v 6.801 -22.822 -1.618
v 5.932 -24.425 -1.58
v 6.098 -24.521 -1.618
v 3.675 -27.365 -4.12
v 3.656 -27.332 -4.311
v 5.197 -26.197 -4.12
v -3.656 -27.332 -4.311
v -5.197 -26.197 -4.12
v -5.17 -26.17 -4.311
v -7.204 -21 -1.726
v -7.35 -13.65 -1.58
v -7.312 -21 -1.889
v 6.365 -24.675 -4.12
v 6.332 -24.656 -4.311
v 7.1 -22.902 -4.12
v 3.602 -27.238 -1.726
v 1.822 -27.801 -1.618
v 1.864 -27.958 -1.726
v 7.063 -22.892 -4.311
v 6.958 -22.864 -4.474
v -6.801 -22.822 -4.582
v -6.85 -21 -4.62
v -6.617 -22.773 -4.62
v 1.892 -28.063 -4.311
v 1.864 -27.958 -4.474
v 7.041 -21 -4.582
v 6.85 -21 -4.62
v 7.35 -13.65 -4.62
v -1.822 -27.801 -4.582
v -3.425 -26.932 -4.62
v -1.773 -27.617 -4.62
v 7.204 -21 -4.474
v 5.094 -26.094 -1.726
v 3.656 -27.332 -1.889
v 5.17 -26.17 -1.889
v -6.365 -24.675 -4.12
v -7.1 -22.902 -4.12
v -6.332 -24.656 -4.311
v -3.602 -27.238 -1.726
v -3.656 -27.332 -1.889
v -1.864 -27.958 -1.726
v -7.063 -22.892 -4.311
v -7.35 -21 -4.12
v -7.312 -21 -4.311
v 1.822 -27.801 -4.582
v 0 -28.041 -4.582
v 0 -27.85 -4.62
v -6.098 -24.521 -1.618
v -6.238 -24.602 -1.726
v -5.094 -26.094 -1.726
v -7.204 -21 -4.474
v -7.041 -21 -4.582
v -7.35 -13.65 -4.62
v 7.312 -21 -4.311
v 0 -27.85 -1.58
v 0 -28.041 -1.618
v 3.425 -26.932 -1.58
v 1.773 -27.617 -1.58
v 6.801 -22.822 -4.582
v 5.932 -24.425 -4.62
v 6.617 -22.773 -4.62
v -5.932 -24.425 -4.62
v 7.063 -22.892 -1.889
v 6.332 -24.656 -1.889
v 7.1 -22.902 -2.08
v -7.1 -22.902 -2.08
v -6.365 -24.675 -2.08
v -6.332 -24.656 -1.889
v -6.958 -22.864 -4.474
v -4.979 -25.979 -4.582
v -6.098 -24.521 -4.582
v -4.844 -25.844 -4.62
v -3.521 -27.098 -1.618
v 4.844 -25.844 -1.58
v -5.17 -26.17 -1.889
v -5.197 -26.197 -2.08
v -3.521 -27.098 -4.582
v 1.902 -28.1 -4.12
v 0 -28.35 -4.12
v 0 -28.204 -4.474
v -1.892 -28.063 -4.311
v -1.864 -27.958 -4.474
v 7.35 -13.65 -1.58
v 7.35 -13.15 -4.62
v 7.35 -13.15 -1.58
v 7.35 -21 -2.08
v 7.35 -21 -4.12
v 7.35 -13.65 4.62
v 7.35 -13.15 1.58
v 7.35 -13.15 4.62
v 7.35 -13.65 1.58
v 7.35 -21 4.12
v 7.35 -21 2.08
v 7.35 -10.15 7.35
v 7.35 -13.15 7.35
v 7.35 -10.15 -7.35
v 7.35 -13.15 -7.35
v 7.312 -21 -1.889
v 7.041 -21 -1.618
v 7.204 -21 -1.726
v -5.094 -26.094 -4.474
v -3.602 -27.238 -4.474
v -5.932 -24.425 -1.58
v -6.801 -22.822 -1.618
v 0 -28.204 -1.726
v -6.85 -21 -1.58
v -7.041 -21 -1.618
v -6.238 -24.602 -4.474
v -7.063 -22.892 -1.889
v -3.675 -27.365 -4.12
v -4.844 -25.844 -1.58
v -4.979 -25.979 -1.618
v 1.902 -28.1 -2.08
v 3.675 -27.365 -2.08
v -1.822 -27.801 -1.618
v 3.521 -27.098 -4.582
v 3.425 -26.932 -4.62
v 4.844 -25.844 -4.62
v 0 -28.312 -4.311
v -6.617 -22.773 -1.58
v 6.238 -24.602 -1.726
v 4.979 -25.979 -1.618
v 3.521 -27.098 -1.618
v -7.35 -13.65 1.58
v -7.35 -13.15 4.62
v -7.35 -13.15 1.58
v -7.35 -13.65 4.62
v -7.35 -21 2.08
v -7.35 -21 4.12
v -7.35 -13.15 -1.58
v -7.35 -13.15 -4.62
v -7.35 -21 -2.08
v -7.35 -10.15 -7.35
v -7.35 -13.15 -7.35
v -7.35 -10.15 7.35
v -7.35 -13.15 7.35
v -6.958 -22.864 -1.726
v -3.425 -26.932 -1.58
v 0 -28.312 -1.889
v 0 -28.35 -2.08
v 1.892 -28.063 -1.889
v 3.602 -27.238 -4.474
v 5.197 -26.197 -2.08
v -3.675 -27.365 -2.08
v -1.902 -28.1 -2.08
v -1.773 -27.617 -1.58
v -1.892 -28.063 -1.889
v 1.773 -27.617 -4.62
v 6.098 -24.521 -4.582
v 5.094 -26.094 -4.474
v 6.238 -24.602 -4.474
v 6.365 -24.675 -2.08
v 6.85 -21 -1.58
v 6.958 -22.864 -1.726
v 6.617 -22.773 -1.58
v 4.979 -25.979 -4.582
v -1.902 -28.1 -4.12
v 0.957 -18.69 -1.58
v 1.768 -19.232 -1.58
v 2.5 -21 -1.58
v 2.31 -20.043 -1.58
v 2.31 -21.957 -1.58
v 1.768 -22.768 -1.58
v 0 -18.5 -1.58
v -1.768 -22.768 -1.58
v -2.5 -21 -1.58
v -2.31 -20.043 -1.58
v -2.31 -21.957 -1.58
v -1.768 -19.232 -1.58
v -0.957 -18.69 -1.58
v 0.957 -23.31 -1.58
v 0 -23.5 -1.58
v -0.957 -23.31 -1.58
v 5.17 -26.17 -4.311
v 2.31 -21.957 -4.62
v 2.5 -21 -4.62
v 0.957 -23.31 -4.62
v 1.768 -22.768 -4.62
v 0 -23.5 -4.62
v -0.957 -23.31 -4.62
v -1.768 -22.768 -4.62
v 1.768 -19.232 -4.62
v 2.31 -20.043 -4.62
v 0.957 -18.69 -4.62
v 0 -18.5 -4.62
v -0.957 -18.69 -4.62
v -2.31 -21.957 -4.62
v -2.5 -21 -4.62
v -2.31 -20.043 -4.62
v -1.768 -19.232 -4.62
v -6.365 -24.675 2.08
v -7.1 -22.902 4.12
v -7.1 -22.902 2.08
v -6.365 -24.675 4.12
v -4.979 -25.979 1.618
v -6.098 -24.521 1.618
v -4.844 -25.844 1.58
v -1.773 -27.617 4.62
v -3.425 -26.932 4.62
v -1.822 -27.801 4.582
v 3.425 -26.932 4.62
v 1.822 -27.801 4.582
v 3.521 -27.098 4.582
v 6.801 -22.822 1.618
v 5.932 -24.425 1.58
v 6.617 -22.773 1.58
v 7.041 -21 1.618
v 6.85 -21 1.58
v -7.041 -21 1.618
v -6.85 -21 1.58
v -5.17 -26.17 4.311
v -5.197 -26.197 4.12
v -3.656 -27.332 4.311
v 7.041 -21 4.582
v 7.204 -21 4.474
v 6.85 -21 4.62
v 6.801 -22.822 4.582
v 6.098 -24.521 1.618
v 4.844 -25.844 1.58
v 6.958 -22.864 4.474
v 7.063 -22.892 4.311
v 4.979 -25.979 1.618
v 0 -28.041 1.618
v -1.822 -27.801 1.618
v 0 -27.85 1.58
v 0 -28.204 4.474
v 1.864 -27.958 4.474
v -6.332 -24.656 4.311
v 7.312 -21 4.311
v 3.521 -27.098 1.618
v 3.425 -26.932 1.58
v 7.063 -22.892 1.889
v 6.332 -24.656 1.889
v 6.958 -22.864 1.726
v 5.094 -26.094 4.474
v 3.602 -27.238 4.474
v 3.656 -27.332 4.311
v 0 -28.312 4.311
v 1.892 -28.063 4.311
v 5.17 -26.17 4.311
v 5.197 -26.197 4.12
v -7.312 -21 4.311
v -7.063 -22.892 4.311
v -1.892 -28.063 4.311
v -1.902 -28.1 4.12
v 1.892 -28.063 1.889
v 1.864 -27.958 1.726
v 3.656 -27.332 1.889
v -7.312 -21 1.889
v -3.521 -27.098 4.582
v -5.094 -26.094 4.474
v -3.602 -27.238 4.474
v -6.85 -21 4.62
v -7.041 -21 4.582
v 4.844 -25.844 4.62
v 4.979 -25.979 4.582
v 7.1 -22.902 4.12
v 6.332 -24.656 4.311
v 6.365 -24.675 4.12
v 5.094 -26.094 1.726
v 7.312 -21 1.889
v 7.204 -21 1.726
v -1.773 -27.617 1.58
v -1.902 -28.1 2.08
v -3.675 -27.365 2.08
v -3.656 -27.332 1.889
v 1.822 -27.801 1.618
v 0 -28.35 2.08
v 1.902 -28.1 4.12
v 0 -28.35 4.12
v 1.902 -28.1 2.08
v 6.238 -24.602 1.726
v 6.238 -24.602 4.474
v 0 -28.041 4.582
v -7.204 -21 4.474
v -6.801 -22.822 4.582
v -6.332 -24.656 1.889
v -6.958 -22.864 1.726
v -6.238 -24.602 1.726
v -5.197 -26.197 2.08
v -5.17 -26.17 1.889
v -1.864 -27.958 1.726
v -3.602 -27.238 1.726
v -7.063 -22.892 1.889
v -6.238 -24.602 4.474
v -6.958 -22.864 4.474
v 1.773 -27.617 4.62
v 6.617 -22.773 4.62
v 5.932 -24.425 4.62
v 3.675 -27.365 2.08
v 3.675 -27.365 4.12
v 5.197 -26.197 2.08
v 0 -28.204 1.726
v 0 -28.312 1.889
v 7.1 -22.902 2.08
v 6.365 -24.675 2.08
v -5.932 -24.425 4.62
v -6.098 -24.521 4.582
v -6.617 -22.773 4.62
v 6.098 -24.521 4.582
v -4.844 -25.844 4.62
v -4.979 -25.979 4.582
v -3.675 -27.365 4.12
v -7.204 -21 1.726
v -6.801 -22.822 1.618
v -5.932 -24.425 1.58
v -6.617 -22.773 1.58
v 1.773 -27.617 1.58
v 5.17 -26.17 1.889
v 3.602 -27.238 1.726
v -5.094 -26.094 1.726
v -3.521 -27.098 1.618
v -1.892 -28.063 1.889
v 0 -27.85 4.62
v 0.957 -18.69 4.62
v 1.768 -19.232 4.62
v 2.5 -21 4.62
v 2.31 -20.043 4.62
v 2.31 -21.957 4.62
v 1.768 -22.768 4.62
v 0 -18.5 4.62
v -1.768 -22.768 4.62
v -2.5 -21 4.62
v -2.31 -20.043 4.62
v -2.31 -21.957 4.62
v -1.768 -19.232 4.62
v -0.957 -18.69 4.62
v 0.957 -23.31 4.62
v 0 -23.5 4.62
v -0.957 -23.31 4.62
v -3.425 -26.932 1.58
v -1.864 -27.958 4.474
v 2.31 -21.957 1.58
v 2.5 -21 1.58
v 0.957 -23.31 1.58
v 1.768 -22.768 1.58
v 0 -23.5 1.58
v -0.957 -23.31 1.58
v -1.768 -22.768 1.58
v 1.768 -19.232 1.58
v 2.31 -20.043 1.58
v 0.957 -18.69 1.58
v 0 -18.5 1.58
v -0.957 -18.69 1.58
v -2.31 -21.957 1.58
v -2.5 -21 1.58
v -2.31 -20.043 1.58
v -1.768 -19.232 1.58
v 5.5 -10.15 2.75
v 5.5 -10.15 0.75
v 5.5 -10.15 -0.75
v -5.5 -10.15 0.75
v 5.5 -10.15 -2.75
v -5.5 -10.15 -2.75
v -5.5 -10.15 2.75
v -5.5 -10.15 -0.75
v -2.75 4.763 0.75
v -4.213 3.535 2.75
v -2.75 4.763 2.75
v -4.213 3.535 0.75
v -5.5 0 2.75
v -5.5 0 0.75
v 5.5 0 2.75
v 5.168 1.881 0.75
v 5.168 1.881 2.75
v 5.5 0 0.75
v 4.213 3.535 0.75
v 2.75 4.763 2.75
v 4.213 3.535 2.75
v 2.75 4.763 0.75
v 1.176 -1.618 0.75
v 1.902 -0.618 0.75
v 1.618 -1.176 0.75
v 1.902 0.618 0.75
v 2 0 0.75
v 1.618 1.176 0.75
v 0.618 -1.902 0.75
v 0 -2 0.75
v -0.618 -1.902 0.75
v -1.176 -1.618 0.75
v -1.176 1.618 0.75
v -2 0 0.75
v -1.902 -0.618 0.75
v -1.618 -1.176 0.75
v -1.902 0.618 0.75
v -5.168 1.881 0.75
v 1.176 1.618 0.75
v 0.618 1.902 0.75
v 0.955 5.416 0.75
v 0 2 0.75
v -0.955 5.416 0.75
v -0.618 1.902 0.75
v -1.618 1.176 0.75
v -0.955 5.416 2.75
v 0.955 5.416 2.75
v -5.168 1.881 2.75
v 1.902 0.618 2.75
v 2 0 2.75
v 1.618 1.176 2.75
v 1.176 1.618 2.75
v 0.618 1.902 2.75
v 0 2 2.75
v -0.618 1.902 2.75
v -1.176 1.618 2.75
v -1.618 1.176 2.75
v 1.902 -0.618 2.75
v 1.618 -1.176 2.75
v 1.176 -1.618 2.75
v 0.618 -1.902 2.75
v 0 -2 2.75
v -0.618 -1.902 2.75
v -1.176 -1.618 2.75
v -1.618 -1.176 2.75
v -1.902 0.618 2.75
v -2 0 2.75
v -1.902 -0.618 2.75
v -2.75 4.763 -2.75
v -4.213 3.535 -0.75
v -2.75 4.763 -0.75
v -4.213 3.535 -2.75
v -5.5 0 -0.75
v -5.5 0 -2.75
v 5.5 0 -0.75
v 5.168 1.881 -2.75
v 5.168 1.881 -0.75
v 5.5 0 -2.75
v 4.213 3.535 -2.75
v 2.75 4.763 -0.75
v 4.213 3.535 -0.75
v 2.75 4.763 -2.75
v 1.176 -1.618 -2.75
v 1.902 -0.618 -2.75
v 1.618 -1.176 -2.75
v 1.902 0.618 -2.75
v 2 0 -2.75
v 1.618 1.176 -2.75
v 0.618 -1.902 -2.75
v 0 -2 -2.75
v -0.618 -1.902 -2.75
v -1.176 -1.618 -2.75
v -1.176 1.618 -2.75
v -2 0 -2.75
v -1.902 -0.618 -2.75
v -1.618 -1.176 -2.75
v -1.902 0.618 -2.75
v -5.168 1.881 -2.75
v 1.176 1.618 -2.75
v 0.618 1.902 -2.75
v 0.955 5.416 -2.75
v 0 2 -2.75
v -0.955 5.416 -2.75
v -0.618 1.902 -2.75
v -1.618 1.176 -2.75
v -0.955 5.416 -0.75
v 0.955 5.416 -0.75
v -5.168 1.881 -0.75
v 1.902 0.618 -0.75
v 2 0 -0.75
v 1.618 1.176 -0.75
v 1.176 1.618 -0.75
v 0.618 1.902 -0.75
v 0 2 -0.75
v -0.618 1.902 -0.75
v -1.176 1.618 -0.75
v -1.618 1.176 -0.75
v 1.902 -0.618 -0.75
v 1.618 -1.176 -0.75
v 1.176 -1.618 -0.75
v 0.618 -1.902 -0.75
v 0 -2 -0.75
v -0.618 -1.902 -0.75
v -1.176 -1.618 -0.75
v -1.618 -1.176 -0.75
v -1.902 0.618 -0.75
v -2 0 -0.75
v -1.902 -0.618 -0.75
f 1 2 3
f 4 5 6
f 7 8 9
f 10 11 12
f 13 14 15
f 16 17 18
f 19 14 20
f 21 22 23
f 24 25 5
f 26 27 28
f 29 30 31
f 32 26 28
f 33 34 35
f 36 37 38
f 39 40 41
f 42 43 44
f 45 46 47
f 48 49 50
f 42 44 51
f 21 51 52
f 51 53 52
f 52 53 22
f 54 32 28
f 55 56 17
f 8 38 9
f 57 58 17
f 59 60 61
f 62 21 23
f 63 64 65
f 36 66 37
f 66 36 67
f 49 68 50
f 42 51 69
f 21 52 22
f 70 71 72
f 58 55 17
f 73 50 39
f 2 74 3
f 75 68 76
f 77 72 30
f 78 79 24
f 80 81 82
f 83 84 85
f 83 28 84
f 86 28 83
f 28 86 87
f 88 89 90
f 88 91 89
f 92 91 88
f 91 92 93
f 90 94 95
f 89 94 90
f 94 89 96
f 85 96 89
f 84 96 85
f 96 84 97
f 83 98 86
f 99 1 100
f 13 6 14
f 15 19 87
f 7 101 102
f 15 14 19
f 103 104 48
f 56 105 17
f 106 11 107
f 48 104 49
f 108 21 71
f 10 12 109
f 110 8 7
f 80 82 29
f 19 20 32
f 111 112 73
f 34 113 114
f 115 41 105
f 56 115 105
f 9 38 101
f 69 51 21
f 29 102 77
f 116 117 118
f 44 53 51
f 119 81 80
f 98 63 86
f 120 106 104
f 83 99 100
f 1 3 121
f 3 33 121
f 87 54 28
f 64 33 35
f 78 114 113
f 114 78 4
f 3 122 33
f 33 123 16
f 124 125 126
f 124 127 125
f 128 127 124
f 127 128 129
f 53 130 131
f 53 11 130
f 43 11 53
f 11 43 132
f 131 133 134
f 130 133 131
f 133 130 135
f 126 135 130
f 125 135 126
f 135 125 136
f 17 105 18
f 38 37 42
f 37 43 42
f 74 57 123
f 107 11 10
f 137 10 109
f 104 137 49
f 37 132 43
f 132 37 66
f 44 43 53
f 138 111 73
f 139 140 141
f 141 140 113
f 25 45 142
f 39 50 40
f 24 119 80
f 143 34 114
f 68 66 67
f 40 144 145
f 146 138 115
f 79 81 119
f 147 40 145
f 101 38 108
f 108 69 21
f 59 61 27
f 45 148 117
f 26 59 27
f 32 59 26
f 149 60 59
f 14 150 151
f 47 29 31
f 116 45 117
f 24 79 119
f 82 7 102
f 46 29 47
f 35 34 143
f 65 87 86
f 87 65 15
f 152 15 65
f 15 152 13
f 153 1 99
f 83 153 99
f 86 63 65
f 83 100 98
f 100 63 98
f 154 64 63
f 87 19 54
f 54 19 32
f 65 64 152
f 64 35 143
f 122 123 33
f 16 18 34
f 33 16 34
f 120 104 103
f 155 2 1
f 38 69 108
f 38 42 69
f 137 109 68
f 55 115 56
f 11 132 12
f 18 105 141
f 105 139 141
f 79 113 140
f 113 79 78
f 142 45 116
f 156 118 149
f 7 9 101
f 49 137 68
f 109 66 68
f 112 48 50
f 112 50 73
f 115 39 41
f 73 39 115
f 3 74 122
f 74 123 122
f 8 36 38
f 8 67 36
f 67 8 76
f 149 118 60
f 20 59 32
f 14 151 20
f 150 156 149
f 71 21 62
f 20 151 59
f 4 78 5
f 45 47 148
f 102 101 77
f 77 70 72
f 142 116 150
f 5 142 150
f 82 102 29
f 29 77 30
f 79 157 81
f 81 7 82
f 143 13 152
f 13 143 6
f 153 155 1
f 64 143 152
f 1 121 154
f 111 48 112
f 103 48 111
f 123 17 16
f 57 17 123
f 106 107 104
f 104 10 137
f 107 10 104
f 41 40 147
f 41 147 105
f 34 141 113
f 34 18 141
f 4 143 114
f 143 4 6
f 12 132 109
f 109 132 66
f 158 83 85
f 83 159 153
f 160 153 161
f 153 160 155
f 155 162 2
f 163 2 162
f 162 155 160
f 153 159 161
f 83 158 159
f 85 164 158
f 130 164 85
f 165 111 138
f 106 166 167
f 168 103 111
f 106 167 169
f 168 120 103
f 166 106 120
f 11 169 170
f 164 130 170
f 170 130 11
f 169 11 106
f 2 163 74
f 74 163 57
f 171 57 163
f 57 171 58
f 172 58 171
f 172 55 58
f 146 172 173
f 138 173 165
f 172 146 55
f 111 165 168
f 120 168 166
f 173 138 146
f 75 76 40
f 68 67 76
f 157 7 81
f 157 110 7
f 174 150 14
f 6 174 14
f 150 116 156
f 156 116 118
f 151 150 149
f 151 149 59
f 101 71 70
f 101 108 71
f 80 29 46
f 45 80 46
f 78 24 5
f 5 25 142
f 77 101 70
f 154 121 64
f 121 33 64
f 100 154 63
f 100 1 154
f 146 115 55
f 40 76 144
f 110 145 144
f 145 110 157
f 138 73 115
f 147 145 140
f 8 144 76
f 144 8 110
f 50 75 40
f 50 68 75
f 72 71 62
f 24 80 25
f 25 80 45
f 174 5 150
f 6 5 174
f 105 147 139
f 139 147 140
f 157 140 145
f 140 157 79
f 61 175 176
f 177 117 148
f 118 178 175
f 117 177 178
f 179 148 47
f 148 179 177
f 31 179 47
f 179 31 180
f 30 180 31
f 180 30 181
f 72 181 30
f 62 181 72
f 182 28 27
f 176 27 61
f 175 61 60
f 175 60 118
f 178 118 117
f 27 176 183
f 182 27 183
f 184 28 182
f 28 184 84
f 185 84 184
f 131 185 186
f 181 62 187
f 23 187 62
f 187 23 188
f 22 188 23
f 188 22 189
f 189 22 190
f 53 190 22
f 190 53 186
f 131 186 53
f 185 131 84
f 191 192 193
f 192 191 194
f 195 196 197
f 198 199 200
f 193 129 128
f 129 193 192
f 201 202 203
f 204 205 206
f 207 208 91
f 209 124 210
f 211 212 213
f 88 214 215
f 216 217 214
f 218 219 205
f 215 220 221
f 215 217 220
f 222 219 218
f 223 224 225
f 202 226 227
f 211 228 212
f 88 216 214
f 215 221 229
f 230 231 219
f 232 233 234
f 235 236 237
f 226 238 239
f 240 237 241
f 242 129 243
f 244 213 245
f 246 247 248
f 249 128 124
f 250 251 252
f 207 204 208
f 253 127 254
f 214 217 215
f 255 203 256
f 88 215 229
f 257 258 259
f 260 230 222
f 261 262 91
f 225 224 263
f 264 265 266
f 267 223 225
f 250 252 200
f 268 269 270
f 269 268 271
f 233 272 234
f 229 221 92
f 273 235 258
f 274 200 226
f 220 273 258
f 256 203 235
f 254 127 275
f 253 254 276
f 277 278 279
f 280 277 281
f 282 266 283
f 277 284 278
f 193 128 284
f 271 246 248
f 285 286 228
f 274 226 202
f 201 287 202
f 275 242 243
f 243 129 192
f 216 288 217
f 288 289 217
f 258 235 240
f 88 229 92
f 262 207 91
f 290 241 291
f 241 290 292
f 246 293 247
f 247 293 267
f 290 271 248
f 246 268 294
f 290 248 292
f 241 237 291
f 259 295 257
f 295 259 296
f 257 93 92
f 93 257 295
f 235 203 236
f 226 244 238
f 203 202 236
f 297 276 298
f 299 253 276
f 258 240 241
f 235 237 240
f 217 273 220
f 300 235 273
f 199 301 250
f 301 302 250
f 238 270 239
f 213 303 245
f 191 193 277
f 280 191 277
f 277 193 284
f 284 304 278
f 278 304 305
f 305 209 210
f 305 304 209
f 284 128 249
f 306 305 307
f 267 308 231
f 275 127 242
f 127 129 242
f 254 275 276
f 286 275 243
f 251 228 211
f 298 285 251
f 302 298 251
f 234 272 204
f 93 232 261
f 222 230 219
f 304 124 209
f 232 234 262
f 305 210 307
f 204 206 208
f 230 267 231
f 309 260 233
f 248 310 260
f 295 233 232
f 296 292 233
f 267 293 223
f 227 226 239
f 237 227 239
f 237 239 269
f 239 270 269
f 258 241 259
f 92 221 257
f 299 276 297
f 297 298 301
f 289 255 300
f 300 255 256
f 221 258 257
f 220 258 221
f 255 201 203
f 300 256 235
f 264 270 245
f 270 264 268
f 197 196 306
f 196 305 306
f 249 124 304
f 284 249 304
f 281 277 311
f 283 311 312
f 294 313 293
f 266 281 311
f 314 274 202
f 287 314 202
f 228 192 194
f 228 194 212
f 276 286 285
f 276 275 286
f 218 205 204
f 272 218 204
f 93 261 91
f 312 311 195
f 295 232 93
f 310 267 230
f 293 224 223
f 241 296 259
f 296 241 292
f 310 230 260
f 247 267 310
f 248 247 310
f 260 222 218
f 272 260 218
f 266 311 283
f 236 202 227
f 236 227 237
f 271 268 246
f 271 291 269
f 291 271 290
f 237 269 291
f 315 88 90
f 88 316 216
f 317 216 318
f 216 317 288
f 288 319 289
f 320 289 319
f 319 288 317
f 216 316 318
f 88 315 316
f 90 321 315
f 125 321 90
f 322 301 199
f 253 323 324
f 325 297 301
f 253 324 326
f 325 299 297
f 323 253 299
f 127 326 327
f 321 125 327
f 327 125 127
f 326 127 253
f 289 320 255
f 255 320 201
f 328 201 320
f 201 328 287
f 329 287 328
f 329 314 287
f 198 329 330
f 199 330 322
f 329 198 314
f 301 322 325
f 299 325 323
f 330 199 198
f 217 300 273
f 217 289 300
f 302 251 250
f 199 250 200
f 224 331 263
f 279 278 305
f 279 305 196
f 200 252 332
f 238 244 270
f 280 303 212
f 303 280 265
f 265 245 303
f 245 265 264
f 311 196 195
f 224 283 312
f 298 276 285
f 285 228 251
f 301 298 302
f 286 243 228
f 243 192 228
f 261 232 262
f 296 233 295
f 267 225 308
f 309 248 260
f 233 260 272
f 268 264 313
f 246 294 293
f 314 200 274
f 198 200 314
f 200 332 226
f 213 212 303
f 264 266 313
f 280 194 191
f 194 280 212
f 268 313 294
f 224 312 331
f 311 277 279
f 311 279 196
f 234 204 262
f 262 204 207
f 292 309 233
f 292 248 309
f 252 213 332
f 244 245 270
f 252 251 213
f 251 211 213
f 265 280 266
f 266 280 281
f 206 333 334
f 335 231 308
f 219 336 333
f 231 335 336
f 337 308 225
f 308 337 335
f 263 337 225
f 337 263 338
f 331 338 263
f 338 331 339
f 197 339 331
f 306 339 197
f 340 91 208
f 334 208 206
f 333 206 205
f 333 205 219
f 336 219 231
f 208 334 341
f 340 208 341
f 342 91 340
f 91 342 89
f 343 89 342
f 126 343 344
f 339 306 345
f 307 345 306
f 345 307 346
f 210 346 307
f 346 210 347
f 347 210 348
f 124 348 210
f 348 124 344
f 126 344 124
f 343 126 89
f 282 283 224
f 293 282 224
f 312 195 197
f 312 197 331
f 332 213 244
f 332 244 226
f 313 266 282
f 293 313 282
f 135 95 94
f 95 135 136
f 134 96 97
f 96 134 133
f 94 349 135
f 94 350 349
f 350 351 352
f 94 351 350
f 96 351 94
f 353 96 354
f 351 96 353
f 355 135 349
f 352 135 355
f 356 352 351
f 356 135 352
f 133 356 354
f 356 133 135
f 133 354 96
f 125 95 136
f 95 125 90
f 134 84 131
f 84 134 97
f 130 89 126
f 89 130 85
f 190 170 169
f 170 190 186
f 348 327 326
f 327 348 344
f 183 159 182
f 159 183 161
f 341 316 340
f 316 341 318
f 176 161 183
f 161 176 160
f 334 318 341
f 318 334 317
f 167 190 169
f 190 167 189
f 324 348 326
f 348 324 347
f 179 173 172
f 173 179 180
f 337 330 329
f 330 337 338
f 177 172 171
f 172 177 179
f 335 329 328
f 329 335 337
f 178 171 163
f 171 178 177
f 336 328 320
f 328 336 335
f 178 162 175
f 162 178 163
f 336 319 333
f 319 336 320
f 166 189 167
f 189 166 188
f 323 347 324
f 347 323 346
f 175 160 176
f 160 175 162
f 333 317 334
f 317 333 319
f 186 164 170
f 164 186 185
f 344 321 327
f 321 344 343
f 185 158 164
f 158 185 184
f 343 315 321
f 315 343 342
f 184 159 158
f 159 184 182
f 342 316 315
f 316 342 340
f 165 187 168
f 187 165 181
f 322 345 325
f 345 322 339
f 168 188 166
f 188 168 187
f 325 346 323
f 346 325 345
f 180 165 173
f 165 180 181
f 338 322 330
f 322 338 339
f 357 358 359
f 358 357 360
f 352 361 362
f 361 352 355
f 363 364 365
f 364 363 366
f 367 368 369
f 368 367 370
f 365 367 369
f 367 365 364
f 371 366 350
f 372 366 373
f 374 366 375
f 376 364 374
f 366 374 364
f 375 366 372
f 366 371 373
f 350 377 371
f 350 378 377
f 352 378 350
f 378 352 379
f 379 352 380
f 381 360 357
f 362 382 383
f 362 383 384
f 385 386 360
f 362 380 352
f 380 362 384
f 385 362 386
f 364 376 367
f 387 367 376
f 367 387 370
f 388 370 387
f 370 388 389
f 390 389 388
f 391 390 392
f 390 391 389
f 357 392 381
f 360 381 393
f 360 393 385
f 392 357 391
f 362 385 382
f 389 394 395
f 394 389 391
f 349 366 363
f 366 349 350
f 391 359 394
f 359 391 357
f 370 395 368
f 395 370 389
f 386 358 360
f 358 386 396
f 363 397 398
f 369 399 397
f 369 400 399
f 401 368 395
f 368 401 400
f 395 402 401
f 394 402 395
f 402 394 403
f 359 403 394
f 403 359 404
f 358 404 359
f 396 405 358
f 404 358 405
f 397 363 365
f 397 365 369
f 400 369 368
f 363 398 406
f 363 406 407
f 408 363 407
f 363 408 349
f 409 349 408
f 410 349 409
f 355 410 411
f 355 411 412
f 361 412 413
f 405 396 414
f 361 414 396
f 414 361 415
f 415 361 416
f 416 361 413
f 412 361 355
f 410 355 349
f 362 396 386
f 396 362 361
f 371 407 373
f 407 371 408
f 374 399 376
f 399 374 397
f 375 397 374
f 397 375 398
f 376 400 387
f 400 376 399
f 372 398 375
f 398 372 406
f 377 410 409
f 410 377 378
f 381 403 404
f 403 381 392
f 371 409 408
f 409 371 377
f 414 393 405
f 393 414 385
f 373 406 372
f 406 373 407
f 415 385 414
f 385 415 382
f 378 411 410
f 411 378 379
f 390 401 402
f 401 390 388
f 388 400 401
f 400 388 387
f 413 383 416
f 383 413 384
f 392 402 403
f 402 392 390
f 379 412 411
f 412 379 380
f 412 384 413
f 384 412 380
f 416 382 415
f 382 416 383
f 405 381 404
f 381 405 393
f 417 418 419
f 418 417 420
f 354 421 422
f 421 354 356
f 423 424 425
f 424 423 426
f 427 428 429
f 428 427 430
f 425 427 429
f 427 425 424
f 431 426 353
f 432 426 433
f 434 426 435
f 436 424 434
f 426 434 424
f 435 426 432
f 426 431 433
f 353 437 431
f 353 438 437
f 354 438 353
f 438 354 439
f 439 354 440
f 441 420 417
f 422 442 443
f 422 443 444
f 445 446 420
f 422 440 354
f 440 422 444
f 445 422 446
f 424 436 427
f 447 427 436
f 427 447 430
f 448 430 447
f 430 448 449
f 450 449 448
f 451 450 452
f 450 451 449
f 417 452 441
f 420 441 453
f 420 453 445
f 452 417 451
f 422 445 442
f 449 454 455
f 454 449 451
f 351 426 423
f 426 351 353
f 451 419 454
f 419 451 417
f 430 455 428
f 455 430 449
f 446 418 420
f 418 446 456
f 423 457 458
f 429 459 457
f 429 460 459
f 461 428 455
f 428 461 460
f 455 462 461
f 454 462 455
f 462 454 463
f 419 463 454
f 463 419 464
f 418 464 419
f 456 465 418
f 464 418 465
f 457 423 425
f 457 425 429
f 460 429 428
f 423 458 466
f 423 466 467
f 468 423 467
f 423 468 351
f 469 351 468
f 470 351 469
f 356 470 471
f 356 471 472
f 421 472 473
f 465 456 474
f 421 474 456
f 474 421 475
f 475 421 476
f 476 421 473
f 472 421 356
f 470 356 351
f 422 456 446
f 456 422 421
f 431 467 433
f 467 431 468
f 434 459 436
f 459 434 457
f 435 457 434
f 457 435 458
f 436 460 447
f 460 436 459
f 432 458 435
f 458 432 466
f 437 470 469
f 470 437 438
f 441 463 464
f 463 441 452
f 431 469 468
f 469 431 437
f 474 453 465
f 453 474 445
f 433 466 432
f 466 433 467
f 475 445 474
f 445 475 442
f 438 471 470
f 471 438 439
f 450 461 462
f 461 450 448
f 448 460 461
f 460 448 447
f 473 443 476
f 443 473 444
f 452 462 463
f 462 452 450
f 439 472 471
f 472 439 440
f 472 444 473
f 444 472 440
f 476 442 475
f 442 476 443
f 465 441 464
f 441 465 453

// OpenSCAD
use <gopro_mounts_mooncactus.scad>

union() {
    translate([0, -21, 0]) gopro_connector("double");

    translate([0, 0, 1.75]) horn(11, 2, 2);
    translate([0, 0, -1.75]) horn(11, 2, 2);
}

module horn(w,t,di) {
   translate([0, 0, -t/2])
    difference() {
      hull() {
         cylinder(d=w,h=t);
         translate([-w/2,-(w/2+5),0]) cube([w,.001,t]);
      }
      translate([0,0,-0.5]) cylinder(t+1, di, di, $fn=20);
   }
}
